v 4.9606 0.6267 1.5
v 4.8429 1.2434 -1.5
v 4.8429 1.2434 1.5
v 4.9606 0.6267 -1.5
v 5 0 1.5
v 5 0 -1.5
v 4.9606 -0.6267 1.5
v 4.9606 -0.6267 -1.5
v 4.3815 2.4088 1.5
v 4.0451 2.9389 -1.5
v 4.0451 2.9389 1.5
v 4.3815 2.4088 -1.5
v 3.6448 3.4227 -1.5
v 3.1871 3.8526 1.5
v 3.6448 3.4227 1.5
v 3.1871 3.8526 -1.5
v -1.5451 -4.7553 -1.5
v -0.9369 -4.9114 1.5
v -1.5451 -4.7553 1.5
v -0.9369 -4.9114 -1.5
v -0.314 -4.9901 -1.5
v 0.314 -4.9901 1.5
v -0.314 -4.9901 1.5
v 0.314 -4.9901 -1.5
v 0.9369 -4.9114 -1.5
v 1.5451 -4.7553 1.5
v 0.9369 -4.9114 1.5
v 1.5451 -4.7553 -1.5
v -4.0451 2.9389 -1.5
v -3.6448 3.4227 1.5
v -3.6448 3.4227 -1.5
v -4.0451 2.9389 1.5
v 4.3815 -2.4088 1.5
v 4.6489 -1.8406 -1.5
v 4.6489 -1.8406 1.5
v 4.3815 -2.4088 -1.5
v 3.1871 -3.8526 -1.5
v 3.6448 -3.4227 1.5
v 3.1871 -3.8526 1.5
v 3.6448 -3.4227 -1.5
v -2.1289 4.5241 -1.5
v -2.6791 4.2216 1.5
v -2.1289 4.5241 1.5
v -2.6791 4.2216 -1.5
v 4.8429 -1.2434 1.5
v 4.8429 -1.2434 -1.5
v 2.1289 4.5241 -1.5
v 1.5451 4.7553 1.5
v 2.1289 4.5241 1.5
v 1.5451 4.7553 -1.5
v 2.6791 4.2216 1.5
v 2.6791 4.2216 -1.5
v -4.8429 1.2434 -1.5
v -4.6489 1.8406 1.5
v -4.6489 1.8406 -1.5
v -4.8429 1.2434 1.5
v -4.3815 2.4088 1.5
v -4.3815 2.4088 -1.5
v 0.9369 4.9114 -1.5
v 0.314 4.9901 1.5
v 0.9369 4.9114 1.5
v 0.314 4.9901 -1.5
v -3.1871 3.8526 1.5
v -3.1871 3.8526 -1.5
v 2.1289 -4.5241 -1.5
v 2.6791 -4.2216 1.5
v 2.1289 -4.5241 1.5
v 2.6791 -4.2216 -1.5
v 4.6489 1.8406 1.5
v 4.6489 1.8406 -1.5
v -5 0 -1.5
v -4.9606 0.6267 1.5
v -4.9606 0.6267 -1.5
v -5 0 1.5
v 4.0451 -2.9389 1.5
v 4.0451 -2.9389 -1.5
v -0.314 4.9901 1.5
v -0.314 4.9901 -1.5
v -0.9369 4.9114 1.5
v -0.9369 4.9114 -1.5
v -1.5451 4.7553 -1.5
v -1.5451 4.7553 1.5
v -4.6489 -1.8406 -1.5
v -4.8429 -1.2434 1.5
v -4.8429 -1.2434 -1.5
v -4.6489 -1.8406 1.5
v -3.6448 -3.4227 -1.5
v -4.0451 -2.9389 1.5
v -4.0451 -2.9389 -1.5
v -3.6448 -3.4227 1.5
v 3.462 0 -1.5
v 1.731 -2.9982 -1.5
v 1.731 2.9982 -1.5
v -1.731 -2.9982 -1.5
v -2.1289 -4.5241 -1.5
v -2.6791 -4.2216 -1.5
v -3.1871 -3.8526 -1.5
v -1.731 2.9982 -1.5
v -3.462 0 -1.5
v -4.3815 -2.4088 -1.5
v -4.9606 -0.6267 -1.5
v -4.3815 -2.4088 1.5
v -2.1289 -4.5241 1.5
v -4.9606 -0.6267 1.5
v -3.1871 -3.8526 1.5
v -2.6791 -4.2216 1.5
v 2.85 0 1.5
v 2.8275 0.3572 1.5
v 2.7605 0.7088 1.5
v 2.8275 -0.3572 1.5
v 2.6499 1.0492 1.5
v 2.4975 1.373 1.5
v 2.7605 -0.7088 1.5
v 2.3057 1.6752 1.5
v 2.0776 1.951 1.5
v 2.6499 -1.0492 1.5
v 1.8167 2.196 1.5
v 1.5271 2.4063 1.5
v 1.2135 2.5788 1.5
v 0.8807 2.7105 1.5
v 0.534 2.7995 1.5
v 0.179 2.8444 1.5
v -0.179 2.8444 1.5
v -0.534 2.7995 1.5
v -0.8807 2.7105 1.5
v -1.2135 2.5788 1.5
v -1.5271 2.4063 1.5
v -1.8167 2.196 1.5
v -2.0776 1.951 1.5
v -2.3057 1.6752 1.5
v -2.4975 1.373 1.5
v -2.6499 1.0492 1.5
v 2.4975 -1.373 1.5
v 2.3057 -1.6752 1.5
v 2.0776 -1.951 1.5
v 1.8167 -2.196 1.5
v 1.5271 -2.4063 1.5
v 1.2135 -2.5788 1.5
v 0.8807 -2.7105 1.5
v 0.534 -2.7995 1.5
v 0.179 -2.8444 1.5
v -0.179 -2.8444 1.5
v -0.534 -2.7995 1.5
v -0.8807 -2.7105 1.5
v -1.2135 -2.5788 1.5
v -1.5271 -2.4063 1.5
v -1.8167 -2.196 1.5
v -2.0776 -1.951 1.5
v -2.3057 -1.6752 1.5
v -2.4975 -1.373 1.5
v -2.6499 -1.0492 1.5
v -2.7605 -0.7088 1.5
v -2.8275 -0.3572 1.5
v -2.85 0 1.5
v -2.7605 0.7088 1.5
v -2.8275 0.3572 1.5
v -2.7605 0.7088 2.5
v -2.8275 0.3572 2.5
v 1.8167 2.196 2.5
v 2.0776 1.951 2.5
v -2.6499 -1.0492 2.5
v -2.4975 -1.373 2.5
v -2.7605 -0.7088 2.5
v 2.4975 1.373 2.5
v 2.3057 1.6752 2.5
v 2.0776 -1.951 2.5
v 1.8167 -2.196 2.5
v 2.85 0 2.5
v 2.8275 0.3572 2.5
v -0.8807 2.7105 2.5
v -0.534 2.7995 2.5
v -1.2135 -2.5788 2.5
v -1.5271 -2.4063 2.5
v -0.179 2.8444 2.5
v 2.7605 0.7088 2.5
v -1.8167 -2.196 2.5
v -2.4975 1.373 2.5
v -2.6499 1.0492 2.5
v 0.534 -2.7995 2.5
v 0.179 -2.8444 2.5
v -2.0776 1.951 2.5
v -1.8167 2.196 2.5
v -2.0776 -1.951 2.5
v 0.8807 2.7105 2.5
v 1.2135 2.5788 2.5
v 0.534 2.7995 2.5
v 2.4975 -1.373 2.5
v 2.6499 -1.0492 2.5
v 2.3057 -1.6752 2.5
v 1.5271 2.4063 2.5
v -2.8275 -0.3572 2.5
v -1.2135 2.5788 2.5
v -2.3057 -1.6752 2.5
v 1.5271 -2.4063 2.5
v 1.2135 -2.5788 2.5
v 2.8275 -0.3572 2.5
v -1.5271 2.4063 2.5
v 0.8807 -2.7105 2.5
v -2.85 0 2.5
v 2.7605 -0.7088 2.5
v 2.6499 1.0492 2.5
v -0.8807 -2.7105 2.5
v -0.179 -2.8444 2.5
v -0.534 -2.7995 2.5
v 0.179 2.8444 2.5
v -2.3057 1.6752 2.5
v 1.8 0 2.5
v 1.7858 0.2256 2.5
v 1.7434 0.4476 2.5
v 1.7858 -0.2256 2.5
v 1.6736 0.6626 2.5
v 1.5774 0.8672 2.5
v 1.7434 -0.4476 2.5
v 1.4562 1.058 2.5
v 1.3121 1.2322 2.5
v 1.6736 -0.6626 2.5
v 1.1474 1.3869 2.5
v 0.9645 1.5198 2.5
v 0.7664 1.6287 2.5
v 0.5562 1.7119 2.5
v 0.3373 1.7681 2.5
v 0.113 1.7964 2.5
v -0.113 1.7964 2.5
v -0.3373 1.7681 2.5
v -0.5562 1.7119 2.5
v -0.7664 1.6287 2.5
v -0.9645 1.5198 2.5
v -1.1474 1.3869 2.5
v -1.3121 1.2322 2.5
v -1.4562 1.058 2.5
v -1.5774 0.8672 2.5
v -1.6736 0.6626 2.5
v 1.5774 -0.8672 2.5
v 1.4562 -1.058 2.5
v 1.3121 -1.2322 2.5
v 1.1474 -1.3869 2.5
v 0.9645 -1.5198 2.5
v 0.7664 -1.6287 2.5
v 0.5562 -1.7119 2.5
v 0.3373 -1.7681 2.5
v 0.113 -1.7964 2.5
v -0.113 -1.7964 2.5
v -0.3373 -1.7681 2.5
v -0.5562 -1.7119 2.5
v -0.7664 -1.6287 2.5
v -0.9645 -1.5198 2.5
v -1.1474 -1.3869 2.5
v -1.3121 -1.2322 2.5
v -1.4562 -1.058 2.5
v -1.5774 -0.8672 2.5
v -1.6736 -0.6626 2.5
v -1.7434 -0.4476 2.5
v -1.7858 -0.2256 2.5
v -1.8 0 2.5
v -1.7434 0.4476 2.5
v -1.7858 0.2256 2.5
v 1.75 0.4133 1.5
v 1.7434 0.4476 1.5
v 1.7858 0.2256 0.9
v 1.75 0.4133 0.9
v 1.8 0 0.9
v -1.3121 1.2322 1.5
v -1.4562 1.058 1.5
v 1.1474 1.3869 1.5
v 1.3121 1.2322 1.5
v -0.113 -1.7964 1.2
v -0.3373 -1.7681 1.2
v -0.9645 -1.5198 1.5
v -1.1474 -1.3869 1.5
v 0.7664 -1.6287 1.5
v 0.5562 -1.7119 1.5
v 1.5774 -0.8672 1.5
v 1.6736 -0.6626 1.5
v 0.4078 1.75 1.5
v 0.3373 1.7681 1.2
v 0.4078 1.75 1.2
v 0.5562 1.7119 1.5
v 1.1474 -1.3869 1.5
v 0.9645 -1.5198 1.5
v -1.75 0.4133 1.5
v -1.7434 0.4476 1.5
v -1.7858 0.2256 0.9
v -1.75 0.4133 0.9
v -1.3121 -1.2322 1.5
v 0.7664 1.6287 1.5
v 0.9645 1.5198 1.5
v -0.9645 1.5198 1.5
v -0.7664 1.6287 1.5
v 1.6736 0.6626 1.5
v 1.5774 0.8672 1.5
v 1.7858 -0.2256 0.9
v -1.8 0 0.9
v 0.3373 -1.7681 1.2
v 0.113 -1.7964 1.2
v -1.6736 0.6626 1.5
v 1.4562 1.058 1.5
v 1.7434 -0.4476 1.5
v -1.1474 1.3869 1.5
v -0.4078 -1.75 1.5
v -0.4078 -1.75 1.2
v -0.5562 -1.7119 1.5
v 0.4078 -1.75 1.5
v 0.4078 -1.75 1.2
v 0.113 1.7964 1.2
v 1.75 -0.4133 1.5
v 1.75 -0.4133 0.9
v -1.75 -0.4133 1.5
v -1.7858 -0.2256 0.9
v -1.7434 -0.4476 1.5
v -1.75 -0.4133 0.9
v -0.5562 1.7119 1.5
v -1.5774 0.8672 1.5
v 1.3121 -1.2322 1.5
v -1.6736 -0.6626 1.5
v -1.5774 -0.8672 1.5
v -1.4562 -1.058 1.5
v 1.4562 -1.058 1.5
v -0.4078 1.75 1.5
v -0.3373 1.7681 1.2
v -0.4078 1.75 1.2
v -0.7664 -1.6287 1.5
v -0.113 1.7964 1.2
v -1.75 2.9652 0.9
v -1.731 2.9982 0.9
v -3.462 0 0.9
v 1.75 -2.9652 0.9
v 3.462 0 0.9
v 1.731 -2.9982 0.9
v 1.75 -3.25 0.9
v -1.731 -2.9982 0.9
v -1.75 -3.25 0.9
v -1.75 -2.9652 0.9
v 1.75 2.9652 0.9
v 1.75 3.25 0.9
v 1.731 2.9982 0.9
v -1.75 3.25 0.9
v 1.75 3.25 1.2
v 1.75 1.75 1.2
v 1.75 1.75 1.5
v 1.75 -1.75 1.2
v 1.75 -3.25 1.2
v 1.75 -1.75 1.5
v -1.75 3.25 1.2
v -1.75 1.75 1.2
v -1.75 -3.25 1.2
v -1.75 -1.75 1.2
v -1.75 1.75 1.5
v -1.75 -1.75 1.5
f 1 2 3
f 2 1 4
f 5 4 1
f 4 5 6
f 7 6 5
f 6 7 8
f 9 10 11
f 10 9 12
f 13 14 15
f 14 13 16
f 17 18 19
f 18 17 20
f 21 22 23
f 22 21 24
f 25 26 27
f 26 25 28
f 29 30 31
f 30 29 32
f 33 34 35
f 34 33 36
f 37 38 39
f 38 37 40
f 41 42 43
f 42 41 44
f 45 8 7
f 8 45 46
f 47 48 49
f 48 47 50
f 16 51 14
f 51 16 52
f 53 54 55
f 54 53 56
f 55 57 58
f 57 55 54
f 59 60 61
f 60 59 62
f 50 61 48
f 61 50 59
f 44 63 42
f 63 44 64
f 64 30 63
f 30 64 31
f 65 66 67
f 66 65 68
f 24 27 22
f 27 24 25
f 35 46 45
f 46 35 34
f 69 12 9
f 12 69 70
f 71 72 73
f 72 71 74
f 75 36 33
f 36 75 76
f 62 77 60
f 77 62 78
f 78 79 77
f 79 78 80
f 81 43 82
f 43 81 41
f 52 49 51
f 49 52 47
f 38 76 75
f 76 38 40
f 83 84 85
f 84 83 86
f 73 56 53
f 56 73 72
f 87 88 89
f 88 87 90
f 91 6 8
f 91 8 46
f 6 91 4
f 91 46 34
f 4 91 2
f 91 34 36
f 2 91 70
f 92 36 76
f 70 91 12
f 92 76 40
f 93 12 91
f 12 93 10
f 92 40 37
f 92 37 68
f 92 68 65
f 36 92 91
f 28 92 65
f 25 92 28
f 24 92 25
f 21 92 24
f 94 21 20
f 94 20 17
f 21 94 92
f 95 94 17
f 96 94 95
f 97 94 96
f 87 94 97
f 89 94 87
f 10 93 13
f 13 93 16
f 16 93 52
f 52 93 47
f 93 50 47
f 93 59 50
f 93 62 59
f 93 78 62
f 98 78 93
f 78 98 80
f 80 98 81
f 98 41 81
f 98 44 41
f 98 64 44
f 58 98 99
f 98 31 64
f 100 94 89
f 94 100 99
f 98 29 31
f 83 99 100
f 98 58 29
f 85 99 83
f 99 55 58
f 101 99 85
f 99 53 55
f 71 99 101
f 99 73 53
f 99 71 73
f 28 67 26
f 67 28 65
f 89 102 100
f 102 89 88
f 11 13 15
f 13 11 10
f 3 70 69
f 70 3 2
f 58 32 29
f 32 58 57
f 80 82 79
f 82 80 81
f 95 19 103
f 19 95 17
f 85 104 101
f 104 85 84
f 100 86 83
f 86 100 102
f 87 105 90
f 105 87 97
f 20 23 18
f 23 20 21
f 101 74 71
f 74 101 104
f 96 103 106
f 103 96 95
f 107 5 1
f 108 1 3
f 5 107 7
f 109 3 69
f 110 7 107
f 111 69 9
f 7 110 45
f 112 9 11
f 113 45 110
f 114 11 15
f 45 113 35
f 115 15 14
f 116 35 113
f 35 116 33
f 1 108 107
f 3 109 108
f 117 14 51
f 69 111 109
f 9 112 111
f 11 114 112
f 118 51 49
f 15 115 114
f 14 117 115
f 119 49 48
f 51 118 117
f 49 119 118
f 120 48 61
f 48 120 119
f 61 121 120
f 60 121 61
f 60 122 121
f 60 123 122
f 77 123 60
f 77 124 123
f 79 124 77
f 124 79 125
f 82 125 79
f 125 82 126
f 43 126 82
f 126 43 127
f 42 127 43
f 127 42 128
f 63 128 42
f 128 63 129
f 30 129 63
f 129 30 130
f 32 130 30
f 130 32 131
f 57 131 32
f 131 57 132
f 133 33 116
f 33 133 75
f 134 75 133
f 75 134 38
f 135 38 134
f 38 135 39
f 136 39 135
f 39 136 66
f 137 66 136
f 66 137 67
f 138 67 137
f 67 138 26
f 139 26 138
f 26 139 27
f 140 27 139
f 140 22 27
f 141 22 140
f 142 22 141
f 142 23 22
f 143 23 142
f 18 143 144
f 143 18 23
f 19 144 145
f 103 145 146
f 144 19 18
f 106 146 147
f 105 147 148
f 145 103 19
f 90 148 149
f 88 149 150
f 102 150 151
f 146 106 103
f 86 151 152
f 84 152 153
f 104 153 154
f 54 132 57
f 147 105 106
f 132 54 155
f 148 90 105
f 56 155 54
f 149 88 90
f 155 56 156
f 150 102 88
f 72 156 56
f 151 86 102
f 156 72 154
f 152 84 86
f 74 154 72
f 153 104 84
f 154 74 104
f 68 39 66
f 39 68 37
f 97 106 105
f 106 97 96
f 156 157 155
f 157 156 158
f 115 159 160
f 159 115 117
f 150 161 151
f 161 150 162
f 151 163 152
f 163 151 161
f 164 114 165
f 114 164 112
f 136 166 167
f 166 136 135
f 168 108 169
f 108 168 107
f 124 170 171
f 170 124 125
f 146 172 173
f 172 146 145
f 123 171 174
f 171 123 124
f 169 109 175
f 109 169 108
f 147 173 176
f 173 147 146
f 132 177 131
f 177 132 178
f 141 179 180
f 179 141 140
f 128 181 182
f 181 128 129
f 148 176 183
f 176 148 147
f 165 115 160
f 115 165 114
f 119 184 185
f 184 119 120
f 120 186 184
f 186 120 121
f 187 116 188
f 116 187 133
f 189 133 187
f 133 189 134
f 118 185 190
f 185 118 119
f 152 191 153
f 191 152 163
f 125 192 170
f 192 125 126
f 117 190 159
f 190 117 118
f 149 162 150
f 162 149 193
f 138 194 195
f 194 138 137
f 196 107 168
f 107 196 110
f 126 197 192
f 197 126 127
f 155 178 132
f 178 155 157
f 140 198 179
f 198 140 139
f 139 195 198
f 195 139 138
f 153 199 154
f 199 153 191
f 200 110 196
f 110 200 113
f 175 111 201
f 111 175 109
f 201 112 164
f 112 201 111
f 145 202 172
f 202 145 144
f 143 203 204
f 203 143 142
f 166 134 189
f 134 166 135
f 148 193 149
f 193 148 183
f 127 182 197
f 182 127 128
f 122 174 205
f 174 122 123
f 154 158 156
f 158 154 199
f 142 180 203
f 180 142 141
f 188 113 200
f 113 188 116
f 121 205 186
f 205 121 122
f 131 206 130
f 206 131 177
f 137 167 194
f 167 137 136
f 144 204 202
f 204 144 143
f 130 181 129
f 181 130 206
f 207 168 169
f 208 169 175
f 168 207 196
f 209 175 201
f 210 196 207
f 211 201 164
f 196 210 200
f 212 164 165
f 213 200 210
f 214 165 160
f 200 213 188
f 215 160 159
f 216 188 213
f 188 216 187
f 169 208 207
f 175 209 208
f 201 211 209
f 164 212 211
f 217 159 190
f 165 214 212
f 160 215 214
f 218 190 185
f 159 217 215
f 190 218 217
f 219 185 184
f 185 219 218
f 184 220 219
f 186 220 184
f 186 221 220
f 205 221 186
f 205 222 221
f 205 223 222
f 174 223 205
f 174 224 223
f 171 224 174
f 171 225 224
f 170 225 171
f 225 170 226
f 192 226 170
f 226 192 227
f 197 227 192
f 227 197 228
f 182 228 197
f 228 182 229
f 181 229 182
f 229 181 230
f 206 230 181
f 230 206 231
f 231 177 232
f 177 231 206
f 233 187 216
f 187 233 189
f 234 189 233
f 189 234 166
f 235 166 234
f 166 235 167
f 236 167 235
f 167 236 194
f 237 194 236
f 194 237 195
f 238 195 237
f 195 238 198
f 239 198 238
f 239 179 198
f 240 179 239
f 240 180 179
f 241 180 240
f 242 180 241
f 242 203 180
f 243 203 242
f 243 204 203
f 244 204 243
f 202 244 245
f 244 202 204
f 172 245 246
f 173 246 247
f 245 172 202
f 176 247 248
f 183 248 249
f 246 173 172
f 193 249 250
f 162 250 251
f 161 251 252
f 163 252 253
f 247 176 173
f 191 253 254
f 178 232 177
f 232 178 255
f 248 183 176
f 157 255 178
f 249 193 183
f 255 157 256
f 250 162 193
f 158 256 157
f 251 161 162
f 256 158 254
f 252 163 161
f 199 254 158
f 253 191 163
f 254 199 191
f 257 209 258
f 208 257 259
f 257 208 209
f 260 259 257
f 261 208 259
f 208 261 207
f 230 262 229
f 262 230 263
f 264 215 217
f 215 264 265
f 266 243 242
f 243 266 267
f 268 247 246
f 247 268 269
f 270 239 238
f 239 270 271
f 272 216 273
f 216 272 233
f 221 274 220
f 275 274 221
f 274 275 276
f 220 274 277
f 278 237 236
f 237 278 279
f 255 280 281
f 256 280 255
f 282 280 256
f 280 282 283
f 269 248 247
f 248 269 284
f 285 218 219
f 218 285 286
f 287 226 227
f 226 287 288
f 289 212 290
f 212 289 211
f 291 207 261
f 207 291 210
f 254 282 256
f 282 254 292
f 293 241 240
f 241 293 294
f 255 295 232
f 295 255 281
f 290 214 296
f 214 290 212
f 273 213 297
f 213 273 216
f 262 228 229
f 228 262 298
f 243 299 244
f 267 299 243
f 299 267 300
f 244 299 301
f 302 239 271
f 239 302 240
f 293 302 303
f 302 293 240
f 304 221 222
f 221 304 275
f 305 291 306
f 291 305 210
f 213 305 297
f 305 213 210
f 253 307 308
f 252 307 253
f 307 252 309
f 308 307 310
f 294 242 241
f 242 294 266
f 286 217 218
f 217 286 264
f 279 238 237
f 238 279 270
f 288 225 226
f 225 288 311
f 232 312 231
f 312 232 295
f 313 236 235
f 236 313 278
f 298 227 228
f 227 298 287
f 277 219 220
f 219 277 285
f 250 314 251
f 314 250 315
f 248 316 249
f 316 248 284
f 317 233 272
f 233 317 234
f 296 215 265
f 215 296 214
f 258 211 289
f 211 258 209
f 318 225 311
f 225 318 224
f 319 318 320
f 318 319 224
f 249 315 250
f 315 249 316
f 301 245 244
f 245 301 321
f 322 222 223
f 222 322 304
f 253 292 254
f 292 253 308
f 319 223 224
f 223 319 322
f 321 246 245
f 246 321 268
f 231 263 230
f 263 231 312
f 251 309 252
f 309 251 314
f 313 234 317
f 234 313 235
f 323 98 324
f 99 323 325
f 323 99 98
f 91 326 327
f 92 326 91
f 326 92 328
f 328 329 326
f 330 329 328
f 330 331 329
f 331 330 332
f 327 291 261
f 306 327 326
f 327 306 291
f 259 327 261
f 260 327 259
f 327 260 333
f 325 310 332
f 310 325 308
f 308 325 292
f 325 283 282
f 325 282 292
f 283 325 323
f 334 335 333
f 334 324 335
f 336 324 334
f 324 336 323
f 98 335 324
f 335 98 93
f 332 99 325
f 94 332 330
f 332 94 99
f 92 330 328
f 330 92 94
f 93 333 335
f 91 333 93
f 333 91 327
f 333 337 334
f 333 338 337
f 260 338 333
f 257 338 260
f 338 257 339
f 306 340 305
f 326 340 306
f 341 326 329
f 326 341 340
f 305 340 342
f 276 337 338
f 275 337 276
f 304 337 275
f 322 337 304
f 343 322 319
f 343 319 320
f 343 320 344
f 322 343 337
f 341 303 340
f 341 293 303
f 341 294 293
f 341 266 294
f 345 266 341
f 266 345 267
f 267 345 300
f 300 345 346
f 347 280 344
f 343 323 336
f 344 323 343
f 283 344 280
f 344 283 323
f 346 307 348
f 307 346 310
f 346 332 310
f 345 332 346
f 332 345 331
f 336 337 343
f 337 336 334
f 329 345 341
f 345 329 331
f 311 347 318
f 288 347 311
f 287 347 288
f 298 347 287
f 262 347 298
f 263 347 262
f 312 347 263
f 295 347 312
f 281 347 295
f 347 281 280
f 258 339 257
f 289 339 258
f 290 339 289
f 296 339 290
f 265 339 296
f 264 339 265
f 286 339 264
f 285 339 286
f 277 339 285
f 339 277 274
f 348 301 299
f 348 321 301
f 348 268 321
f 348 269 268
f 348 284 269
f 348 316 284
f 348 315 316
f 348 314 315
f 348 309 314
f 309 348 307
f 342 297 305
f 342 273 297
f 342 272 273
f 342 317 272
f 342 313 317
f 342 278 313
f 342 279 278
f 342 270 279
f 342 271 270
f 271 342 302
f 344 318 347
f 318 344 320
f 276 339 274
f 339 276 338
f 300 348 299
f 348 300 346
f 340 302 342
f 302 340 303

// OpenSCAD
$fn = 50;


difference() {
	union() {
		translate(v = [0, 0, -1.5000000000]) {
			rotate(a = [0, 0, 0]) {
				cylinder(h = 3, r = 5.0000000000);
			}
		}
		translate(v = [0, 0, -1.5000000000]) {
			rotate(a = [0, 0, 0]) {
				cylinder(h = 4, r = 2.8500000000);
			}
		}
	}
	union() {
		translate(v = [0, 0, -125.0000000000]) {
			rotate(a = [0, 0, 0]) {
				cylinder(h = 250, r = 1.8000000000);
			}
		}
		translate(v = [0, 0, -2.1000000000]) {
			rotate(a = [0, 0, 0]) {
				#translate(v = [0, 0, 0]) {
					rotate(a = [0, 0, 0]) {
						linear_extrude(height = 3) {
							polygon(points = [[3.4620000000, 0.0000000000], [1.7310000000, 2.9981799479], [-1.7310000000, 2.9981799479], [-3.4620000000, 0.0000000000], [-1.7310000000, -2.9981799479], [1.7310000000, -2.9981799479]]);
						}
					}
				}
			}
		}
		#translate(v = [-1.7500000000, -3.2500000000, 0.9000000000]) {
			rotate(a = [0, 0, 0]) {
				cube(size = [3.5000000000, 6.5000000000, 0.3000000000]);
			}
		}
		#translate(v = [-1.7500000000, -1.7500000000, 1.2000000000]) {
			rotate(a = [0, 0, 0]) {
				cube(size = [3.5000000000, 3.5000000000, 0.3000000000]);
			}
		}
		#translate(v = [-1.7500000000, -3.2500000000, -2.4000000000]) {
			rotate(a = [0, 0, 0]) {
				cube(size = [3.5000000000, 6.5000000000, 0.3000000000]);
			}
		}
		#translate(v = [-1.7500000000, -1.7500000000, -2.7000000000]) {
			rotate(a = [0, 0, 0]) {
				cube(size = [3.5000000000, 3.5000000000, 0.3000000000]);
			}
		}
	}
}
